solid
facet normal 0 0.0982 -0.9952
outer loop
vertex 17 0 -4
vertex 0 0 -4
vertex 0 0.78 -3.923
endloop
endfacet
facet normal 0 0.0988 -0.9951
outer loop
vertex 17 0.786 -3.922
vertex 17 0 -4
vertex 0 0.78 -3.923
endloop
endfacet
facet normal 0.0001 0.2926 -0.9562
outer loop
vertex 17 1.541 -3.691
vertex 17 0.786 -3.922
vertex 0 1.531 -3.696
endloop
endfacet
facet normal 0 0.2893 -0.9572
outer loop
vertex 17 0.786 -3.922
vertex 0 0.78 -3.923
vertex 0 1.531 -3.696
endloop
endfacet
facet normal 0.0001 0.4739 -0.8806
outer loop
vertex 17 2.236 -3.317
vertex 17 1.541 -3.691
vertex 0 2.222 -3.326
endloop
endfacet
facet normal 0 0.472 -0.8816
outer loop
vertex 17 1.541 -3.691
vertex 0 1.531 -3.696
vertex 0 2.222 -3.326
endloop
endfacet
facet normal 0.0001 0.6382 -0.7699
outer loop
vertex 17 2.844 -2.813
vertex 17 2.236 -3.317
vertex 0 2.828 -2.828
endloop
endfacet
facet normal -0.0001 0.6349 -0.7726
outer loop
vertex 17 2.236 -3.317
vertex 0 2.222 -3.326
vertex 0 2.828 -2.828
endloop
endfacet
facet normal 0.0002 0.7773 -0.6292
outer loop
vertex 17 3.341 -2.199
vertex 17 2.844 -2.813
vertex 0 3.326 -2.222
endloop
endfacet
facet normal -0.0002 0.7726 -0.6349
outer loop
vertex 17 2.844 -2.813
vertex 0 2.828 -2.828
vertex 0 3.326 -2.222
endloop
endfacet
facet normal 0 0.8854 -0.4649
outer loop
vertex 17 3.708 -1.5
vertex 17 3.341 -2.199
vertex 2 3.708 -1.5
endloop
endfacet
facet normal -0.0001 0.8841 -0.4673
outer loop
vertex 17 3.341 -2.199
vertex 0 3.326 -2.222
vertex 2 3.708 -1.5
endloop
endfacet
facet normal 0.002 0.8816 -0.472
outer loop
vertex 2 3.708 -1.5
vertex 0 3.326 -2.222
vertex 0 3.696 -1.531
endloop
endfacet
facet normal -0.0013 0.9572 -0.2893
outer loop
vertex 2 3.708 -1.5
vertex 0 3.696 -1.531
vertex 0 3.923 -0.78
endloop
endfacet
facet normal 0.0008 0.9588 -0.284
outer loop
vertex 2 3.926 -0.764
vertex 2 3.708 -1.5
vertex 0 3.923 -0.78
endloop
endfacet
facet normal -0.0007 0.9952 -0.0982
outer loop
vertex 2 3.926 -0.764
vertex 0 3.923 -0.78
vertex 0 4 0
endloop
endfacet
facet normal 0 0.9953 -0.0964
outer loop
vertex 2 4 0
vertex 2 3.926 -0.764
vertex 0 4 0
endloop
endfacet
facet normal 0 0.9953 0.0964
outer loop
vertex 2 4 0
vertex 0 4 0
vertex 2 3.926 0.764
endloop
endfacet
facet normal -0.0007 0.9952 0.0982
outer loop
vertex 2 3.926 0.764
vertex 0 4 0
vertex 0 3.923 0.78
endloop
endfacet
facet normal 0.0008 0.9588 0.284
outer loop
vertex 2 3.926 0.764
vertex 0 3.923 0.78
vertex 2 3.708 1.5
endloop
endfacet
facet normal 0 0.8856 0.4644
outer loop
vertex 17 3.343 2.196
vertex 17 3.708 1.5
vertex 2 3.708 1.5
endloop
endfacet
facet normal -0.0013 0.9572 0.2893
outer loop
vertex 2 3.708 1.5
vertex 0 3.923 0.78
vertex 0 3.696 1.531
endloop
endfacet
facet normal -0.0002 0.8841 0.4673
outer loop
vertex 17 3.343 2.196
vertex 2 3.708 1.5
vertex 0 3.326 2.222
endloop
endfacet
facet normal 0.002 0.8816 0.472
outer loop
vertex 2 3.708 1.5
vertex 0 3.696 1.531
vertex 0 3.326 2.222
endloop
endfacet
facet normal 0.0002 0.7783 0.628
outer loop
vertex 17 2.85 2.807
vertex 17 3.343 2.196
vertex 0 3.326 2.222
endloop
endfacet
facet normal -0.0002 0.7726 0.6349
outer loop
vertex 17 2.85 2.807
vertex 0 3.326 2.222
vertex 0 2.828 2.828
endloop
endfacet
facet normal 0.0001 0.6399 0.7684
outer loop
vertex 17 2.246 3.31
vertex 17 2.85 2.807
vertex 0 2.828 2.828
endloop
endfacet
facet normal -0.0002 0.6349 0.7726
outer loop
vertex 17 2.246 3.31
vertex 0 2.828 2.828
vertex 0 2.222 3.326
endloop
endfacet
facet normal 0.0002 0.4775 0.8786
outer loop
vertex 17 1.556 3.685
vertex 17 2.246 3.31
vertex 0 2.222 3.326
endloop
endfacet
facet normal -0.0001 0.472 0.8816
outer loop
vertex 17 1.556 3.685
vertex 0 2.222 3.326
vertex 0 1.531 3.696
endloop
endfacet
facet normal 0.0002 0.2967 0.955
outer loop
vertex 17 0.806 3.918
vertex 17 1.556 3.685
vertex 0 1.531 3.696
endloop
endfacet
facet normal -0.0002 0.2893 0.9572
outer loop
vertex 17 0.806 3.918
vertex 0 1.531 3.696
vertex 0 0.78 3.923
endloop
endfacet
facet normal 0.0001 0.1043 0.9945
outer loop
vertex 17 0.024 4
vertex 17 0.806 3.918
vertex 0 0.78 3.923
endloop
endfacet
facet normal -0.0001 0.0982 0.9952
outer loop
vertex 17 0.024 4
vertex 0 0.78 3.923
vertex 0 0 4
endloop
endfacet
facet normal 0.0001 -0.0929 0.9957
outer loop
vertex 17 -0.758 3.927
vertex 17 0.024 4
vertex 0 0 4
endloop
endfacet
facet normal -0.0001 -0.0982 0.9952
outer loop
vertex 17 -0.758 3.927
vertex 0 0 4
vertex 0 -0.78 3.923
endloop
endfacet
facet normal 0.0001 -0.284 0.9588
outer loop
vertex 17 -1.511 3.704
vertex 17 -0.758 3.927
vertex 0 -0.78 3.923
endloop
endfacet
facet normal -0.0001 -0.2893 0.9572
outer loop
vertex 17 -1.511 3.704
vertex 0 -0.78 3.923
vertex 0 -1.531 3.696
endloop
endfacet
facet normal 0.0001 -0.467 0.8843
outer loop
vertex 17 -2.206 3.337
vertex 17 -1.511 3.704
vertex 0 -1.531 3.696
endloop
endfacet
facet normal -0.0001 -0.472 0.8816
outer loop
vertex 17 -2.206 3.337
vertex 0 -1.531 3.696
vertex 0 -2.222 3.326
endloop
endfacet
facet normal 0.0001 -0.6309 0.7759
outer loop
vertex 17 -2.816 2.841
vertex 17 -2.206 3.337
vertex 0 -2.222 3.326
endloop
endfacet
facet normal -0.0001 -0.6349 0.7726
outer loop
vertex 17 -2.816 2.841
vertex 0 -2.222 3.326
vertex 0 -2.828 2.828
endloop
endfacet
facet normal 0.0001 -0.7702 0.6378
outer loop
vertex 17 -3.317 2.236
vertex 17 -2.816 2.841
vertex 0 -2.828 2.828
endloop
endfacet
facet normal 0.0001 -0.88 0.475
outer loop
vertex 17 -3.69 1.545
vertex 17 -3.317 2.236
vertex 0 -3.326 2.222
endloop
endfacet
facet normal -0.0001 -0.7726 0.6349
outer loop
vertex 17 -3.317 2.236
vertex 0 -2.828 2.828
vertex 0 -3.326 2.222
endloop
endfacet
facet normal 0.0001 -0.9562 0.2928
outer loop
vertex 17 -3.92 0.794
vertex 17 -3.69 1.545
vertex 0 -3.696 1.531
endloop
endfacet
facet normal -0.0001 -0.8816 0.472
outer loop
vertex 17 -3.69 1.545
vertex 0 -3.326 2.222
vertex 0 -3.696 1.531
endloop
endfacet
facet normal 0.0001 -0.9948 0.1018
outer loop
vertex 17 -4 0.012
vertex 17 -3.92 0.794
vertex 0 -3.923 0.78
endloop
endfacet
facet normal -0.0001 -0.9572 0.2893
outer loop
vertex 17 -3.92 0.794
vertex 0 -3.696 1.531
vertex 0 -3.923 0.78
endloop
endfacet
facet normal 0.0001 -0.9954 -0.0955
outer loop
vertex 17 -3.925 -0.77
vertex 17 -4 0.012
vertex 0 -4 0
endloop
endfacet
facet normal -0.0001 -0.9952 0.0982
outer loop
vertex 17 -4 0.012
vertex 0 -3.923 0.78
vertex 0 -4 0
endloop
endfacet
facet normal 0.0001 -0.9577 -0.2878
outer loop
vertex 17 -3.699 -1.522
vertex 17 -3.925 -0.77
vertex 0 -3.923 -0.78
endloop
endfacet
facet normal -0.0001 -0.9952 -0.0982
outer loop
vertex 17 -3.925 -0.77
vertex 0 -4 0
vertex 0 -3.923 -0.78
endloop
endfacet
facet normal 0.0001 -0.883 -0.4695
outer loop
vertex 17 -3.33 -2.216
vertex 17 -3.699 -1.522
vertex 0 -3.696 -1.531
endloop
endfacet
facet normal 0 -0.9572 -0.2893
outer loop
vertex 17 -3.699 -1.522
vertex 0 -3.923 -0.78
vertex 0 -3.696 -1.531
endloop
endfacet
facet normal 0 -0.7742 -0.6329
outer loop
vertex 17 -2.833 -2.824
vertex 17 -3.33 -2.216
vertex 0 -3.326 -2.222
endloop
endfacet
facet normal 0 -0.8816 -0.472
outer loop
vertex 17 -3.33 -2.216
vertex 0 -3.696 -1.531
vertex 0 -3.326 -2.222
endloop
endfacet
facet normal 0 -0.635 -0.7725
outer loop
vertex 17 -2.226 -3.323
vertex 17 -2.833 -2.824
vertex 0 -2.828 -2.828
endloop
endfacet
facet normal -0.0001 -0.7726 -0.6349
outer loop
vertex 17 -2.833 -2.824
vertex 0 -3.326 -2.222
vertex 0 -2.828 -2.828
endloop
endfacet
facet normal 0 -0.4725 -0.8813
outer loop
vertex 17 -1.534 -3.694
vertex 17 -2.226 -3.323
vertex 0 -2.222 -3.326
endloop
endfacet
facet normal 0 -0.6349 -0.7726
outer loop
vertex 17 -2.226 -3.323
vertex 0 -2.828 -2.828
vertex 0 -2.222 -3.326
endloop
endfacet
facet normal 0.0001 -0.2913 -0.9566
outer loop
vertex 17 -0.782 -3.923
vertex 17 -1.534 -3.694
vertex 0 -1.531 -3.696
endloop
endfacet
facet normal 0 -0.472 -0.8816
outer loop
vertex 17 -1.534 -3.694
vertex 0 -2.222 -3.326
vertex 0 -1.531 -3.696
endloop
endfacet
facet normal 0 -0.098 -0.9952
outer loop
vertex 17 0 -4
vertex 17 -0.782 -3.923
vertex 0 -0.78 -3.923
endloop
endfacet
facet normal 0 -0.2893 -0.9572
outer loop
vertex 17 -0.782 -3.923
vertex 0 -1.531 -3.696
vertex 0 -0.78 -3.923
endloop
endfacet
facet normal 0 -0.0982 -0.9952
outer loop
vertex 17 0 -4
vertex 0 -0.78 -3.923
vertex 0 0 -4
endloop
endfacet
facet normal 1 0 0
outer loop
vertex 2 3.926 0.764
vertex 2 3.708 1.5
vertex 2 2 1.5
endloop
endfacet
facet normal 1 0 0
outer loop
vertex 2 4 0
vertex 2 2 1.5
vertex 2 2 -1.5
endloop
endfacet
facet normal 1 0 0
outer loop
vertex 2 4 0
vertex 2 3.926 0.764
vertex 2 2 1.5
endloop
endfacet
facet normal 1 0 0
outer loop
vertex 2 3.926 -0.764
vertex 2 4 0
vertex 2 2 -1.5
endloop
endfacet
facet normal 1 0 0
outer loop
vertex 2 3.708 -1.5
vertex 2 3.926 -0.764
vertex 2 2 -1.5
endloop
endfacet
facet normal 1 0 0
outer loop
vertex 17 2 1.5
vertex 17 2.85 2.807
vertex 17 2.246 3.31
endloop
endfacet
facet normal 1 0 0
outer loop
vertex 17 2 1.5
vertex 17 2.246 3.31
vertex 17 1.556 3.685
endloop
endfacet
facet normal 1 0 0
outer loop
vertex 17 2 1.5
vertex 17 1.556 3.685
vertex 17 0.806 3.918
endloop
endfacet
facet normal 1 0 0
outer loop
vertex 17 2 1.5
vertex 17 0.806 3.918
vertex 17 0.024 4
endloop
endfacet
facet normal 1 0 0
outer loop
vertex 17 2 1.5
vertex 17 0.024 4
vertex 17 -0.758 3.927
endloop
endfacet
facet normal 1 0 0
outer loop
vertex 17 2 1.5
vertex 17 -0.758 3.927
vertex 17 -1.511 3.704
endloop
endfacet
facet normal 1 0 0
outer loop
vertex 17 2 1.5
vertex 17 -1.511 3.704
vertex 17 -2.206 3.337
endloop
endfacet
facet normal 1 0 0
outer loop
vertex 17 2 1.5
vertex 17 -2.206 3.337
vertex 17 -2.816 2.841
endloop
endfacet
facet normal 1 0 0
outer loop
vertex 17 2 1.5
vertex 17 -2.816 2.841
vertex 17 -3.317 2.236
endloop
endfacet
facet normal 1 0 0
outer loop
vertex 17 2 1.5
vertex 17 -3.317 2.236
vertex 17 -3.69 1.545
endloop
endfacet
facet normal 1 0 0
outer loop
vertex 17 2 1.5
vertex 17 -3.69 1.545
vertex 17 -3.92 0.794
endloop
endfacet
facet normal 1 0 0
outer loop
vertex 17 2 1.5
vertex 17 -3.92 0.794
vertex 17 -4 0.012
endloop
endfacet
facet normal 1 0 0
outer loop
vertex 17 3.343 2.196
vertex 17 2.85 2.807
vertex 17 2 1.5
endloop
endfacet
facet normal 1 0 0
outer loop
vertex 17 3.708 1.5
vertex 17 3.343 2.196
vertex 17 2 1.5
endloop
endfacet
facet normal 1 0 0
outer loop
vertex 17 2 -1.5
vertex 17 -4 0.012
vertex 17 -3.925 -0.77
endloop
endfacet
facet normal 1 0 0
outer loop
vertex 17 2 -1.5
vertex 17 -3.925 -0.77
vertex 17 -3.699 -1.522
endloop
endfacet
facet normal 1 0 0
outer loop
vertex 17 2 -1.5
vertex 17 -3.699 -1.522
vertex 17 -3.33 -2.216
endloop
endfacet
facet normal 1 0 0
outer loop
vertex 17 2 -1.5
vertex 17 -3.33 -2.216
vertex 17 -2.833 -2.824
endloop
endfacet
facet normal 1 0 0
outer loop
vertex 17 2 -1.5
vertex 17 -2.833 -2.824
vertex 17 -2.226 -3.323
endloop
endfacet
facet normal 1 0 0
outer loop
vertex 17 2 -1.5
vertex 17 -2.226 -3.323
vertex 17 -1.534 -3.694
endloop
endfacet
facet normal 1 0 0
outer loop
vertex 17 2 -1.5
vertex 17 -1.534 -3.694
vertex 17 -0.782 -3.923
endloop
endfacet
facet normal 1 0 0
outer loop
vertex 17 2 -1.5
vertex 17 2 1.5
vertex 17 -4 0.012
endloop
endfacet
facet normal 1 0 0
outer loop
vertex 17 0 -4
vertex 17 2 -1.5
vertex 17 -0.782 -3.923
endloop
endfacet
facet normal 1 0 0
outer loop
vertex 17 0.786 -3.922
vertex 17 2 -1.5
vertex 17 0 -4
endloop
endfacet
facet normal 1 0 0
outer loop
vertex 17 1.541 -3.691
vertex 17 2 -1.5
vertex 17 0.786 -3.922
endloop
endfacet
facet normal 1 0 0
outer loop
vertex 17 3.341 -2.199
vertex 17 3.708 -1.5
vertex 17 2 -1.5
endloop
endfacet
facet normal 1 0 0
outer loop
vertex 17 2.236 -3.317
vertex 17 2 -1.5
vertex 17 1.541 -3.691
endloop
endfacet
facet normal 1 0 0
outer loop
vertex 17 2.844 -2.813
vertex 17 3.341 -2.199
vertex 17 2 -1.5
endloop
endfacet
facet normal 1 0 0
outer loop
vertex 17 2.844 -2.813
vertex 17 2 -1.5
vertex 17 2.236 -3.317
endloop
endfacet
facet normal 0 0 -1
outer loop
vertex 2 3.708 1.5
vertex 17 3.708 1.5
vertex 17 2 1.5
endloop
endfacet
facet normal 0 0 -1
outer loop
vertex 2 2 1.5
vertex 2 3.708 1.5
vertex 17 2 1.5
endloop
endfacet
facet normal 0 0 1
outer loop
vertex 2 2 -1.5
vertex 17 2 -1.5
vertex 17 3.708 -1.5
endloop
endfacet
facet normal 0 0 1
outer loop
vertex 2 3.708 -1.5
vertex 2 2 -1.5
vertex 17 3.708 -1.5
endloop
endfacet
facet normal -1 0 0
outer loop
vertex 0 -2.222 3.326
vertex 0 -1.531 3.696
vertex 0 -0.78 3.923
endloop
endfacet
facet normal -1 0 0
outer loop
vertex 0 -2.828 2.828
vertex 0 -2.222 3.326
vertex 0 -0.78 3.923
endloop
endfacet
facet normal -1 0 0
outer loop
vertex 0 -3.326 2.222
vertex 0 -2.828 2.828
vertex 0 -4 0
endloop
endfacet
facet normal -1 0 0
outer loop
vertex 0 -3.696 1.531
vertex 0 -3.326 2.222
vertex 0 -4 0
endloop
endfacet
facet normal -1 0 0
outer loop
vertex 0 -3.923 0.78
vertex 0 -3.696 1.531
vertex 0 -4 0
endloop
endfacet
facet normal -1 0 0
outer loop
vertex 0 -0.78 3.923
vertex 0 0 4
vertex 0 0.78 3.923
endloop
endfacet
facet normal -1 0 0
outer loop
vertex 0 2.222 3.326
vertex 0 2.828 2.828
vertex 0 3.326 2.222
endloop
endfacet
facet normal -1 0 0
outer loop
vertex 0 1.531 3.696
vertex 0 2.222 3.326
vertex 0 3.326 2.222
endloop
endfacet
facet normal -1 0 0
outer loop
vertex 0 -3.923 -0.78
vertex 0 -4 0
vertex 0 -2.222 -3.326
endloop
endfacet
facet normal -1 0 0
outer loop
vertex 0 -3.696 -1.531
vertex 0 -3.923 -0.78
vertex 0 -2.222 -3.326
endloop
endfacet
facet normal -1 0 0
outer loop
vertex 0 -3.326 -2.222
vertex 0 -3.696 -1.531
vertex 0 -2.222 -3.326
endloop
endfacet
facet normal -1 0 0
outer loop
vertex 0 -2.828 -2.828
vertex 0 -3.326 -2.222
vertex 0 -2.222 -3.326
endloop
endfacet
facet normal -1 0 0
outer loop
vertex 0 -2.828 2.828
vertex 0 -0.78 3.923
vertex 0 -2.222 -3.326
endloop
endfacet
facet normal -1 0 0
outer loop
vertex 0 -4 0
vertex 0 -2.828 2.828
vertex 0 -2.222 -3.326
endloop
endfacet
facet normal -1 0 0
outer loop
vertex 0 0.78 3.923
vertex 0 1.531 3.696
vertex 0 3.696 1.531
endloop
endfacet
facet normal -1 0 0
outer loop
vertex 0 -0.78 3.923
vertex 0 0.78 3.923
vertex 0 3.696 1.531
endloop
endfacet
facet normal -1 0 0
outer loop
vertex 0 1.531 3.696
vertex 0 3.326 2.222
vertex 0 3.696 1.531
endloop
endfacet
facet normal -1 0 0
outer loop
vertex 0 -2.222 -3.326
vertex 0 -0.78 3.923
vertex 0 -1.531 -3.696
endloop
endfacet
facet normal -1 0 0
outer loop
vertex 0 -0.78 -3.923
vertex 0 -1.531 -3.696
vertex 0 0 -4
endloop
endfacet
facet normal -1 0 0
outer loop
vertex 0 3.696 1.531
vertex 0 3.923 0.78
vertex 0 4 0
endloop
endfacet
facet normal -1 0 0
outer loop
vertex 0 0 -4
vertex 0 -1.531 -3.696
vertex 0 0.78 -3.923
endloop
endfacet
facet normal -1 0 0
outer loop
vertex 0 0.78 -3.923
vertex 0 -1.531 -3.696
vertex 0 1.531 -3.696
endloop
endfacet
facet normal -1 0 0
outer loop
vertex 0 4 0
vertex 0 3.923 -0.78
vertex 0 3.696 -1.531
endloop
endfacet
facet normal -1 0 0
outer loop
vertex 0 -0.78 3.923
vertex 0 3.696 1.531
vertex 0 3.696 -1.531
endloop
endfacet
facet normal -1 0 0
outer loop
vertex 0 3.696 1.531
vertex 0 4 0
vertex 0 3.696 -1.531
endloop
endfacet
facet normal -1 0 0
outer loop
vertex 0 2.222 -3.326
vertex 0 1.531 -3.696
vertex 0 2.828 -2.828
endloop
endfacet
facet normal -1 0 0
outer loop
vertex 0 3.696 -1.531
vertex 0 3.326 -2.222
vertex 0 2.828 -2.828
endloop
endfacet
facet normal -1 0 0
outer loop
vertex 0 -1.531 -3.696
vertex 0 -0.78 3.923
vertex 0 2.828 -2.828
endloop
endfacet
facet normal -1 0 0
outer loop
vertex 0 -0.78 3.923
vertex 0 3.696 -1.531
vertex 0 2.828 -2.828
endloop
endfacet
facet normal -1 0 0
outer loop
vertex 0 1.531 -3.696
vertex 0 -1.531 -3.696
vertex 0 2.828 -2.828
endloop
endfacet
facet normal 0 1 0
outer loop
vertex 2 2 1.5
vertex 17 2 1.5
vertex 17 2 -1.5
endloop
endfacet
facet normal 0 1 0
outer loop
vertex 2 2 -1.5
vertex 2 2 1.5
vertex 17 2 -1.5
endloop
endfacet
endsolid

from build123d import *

# Parameters (mm, degrees)
SKETCH_1_R          = 4
EXTRUDE_1_DEPTH     = 17
CUT_EXTRUDE_1_DEPTH = 15


with BuildPart() as part:
    # 草图1 → 凸台-拉伸1 (new body)
    with BuildSketch(Plane(origin=(0, 0, 0), x_dir=(0, 0, -1), z_dir=(1, 0, 0))):
        Circle(SKETCH_1_R)
    extrude(amount=EXTRUDE_1_DEPTH)

    # 草图2 → 切除-拉伸1 (cut)
    with BuildSketch(Plane(origin=(17, 0, 0), x_dir=(0, 0, -1), z_dir=(1, 0, 0))):
        Polygon((-1.5, 32.646398423), (-1.5, 3.708099244), (-1.5, 2), (1.5, 2), (1.5, 3.708099244), (1.5, 32.646398423), (1.5, 90.522996781), (-1.5, 90.522996781), align=None)
    extrude(amount=-CUT_EXTRUDE_1_DEPTH, mode=Mode.SUBTRACT)


solid = part.part
